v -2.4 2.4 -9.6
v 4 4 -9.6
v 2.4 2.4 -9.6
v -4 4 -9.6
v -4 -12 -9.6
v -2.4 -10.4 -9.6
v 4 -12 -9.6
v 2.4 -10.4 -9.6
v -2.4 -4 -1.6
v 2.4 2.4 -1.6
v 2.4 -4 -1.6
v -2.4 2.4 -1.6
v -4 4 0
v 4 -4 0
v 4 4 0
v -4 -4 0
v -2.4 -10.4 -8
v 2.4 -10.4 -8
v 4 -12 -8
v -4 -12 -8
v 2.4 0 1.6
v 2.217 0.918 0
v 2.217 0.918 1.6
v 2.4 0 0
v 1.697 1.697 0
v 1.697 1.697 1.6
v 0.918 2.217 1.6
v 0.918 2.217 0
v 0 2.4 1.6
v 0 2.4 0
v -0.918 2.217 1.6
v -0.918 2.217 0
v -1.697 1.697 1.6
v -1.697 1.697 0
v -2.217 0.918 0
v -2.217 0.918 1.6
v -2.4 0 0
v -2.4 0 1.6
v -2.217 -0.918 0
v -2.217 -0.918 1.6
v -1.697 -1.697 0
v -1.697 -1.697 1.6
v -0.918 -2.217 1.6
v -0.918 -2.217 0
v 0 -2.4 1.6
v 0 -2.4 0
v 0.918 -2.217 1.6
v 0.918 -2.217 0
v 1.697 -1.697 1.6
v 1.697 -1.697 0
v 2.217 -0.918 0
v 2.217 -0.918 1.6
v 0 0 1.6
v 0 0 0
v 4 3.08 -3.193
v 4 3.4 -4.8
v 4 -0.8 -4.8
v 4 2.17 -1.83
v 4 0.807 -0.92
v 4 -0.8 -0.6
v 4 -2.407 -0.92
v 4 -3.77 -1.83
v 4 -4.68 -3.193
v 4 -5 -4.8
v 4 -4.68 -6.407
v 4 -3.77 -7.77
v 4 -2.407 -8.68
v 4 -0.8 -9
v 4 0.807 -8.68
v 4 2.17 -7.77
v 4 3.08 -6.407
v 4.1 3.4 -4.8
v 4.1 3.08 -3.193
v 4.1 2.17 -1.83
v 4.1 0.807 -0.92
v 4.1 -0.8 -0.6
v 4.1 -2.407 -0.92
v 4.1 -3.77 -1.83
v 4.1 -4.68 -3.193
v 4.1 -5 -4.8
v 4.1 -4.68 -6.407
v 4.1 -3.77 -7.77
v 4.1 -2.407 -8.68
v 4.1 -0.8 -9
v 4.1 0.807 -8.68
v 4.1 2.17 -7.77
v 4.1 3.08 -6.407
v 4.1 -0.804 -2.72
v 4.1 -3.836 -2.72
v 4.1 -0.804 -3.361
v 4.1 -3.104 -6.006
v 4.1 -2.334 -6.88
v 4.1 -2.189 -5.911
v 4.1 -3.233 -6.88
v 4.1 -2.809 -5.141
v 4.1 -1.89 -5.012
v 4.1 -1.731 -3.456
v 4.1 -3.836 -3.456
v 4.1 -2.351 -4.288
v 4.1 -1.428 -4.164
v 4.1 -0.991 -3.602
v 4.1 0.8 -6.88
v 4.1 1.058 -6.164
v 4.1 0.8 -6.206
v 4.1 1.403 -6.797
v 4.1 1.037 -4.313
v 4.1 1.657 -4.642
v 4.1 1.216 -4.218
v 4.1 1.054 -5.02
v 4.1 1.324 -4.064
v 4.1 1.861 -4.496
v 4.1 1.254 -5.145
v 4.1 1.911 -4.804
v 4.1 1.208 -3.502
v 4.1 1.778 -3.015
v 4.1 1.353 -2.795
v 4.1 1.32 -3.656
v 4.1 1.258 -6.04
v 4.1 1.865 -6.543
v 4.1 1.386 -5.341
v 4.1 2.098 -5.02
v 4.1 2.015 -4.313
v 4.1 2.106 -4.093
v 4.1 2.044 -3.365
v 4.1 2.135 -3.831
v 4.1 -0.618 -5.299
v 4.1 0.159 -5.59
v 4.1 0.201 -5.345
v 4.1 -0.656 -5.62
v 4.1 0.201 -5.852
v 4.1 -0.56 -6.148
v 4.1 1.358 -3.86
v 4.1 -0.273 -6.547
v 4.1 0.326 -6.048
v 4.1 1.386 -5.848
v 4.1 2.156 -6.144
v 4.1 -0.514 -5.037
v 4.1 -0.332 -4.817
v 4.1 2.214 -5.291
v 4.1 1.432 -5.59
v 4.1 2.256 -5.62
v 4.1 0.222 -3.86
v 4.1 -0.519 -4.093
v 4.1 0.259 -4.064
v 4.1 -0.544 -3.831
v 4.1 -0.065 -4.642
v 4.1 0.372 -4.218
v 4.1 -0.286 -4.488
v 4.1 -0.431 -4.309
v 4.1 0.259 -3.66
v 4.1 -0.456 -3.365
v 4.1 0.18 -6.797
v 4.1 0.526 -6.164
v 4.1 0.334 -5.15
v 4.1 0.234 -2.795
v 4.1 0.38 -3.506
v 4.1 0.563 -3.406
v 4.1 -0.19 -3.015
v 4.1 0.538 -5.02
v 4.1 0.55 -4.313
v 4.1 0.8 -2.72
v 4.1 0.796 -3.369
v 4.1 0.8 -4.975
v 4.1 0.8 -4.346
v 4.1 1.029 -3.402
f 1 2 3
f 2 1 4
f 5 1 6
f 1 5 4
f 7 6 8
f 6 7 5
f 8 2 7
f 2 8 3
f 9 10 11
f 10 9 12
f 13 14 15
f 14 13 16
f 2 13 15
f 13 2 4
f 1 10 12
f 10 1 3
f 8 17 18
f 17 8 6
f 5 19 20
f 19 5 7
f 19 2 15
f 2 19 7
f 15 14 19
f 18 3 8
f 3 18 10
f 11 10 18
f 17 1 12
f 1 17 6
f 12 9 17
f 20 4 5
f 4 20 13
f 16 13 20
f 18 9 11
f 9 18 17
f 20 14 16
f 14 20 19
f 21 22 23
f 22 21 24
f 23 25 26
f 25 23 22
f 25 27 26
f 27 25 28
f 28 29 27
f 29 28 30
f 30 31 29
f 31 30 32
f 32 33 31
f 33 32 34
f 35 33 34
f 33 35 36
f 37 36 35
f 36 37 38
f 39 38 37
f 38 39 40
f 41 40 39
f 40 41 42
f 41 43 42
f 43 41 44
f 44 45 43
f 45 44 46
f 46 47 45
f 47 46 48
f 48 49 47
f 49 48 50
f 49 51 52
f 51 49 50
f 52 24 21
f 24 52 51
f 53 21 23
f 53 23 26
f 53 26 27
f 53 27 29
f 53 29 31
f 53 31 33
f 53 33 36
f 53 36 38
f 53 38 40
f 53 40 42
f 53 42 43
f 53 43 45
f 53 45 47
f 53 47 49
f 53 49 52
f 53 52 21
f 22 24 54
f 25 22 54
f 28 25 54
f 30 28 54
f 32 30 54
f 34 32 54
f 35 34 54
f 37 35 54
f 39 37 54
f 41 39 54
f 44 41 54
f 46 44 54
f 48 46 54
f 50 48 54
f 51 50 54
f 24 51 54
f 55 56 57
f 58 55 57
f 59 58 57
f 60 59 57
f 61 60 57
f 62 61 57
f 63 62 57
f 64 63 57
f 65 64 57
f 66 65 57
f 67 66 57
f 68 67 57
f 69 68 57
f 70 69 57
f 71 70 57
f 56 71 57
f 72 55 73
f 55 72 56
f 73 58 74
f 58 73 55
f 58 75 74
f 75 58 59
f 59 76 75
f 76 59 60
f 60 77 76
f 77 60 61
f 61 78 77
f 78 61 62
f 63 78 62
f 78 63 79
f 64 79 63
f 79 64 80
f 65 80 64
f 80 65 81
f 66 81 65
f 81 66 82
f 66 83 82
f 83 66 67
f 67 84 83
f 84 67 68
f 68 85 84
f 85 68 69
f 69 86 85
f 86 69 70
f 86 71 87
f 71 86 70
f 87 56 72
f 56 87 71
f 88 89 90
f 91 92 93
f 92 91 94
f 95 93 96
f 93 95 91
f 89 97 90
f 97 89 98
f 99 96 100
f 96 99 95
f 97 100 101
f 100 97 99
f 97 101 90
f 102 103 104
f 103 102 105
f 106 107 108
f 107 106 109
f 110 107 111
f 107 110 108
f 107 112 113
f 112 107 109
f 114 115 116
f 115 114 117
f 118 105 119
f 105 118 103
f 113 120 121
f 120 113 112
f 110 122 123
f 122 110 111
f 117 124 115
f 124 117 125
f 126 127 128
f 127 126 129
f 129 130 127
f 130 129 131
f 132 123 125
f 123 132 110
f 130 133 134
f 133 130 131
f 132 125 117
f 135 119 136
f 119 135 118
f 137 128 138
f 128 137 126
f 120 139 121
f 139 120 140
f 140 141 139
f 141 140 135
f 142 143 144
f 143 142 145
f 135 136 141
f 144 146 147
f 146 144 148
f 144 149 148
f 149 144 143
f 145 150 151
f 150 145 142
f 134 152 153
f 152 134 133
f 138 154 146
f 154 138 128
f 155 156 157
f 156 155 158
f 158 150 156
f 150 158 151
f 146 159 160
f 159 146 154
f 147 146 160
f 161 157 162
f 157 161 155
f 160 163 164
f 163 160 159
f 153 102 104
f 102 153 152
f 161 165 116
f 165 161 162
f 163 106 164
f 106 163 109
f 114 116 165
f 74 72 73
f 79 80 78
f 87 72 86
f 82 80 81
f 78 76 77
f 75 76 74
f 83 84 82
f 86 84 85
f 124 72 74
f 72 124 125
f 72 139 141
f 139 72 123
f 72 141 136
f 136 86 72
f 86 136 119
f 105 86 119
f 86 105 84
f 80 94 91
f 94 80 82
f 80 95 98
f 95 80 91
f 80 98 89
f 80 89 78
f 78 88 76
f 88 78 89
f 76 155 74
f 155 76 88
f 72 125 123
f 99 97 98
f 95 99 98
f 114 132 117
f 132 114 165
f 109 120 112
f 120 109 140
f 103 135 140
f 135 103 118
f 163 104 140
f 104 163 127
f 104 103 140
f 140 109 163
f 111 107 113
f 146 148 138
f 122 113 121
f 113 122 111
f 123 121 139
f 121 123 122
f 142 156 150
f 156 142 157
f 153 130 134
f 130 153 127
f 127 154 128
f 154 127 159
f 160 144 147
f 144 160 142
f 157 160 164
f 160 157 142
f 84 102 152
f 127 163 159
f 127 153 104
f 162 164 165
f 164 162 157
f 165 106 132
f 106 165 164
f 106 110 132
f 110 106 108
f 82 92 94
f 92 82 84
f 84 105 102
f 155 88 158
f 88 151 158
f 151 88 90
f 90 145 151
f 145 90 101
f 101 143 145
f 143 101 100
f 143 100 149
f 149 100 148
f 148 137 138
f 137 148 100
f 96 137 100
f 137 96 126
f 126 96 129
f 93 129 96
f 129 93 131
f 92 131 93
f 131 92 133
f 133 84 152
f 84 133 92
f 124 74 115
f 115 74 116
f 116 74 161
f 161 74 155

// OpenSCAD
// file: ../p/4-4edge.scad
use <../lib.scad>
function ldraw_lib__4_4edge() = [
// 0 Circle 1.0
// 0 Name: 4-4edge.dat
// 0 Author: James Jessiman
// 0 !LDRAW_ORG Primitive UPDATE 2017-01
// 0 !LICENSE Licensed under CC BY 2.0 and CC BY 4.0 : see CAreadme.txt
// 
// 0 BFC CERTIFY CCW
  [0,"BFC","CERTIFY"],
  [0,"BFC","CCW"],
// 
// 0 !HISTORY 1998-12-15 [PTadmin] Official Update 1998-10
// 0 !HISTORY 2005-12-28 [PTadmin] Official Update 2005-01
// 0 !HISTORY 2007-06-24 [PTadmin] Header formatted for Contributor Agreement
// 0 !HISTORY 2008-07-01 [PTadmin] Official Update 2008-01
// 0 !HISTORY 2017-01-15 [Steffen] BFCed
// 0 !HISTORY 2017-12-30 [PTadmin] Official Update 2017-01
// 
// 
// 2 24 1 0 0 0.9239 0 0.3827
  [2,24,1,0,0,0.9239,0,0.3827],
// 2 24 0.9239 0 0.3827 0.7071 0 0.7071
  [2,24,0.9239,0,0.3827,0.7071,0,0.7071],
// 2 24 0.7071 0 0.7071 0.3827 0 0.9239
  [2,24,0.7071,0,0.7071,0.3827,0,0.9239],
// 2 24 0.3827 0 0.9239 0 0 1
  [2,24,0.3827,0,0.9239,0,0,1],
// 2 24 0 0 1 -0.3827 0 0.9239
  [2,24,0,0,1,-0.3827,0,0.9239],
// 2 24 -0.3827 0 0.9239 -0.7071 0 0.7071
  [2,24,-0.3827,0,0.9239,-0.7071,0,0.7071],
// 2 24 -0.7071 0 0.7071 -0.9239 0 0.3827
  [2,24,-0.7071,0,0.7071,-0.9239,0,0.3827],
// 2 24 -0.9239 0 0.3827 -1 0 -0
  [2,24,-0.9239,0,0.3827,-1,0,-0],
// 2 24 -1 0 -0 -0.9239 0 -0.3827
  [2,24,-1,0,-0,-0.9239,0,-0.3827],
// 2 24 -0.9239 0 -0.3827 -0.7071 0 -0.7071
  [2,24,-0.9239,0,-0.3827,-0.7071,0,-0.7071],
// 2 24 -0.7071 0 -0.7071 -0.3827 0 -0.9239
  [2,24,-0.7071,0,-0.7071,-0.3827,0,-0.9239],
// 2 24 -0.3827 0 -0.9239 0 0 -1
  [2,24,-0.3827,0,-0.9239,0,0,-1],
// 2 24 0 0 -1 0.3827 0 -0.9239
  [2,24,0,0,-1,0.3827,0,-0.9239],
// 2 24 0.3827 0 -0.9239 0.7071 0 -0.7071
  [2,24,0.3827,0,-0.9239,0.7071,0,-0.7071],
// 2 24 0.7071 0 -0.7071 0.9239 0 -0.3827
  [2,24,0.7071,0,-0.7071,0.9239,0,-0.3827],
// 2 24 0.9239 0 -0.3827 1 0 0
  [2,24,0.9239,0,-0.3827,1,0,0],
];
module ldraw_lib__4_4edge(step=0, col=false, unit=2/5, alt=false, line=0.2, solid=!$preview)
    makepoly(ldraw_lib__4_4edge(), step=step, col=col, unit=unit, alt=alt, line=line, solid=solid);
ldraw_lib__4_4edge(line=0.2);
// file: ../p/4-4disc.scad
use <../lib.scad>
function ldraw_lib__4_4disc() = [
// 0 Disc 1.0
// 0 Name: 4-4disc.dat
// 0 Author: James Jessiman
// 0 !LDRAW_ORG Primitive UPDATE 2002-02
// 0 !LICENSE Licensed under CC BY 2.0 and CC BY 4.0 : see CAreadme.txt
// 
// 0 BFC CERTIFY CCW
  [0,"BFC","CERTIFY"],
  [0,"BFC","CCW"],
// 
// 0 !HISTORY 1998-12-15 [PTadmin] Official Update 1998-10
// 0 !HISTORY 2002-03-23 [sbliss] Added BFC statement
// 0 !HISTORY 2002-04-25 [PTadmin] Official Update 2002-02
// 0 !HISTORY 2007-06-24 [PTadmin] Header formatted for Contributor Agreement
// 0 !HISTORY 2008-07-01 [PTadmin] Official Update 2008-01
// 
// 
// 3 16 0 0 0 1 0 0 0.9239 0 0.3827
  [3,16,0,0,0,1,0,0,0.9239,0,0.3827],
// 3 16 0 0 0 0.9239 0 0.3827 0.7071 0 0.7071
  [3,16,0,0,0,0.9239,0,0.3827,0.7071,0,0.7071],
// 3 16 0 0 0 0.7071 0 0.7071 0.3827 0 0.9239
  [3,16,0,0,0,0.7071,0,0.7071,0.3827,0,0.9239],
// 3 16 0 0 0 0.3827 0 0.9239 0 0 1
  [3,16,0,0,0,0.3827,0,0.9239,0,0,1],
// 3 16 0 0 0 0 0 1 -0.3827 0 0.9239
  [3,16,0,0,0,0,0,1,-0.3827,0,0.9239],
// 3 16 0 0 0 -0.3827 0 0.9239 -0.7071 0 0.7071
  [3,16,0,0,0,-0.3827,0,0.9239,-0.7071,0,0.7071],
// 3 16 0 0 0 -0.7071 0 0.7071 -0.9239 0 0.3827
  [3,16,0,0,0,-0.7071,0,0.7071,-0.9239,0,0.3827],
// 3 16 0 0 0 -0.9239 0 0.3827 -1 0 -0
  [3,16,0,0,0,-0.9239,0,0.3827,-1,0,-0],
// 3 16 0 0 0 -1 0 -0 -0.9239 0 -0.3827
  [3,16,0,0,0,-1,0,-0,-0.9239,0,-0.3827],
// 3 16 0 0 0 -0.9239 0 -0.3827 -0.7071 0 -0.7071
  [3,16,0,0,0,-0.9239,0,-0.3827,-0.7071,0,-0.7071],
// 3 16 0 0 0 -0.7071 0 -0.7071 -0.3827 0 -0.9239
  [3,16,0,0,0,-0.7071,0,-0.7071,-0.3827,0,-0.9239],
// 3 16 0 0 0 -0.3827 0 -0.9239 0 0 -1
  [3,16,0,0,0,-0.3827,0,-0.9239,0,0,-1],
// 3 16 0 0 0 0 0 -1 0.3827 0 -0.9239
  [3,16,0,0,0,0,0,-1,0.3827,0,-0.9239],
// 3 16 0 0 0 0.3827 0 -0.9239 0.7071 0 -0.7071
  [3,16,0,0,0,0.3827,0,-0.9239,0.7071,0,-0.7071],
// 3 16 0 0 0 0.7071 0 -0.7071 0.9239 0 -0.3827
  [3,16,0,0,0,0.7071,0,-0.7071,0.9239,0,-0.3827],
// 3 16 0 0 0 0.9239 0 -0.3827 1 0 0
  [3,16,0,0,0,0.9239,0,-0.3827,1,0,0],
// 0
];
module ldraw_lib__4_4disc(step=0, col=false, unit=2/5, alt=false, line=0.2, solid=!$preview)
    makepoly(ldraw_lib__4_4disc(), step=step, col=col, unit=unit, alt=alt, line=line, solid=solid);
ldraw_lib__4_4disc(line=0.2);
// file: ../p/4-4cyli.scad
use <../lib.scad>
$fa=1; $fs=0.2;
function ldraw_lib__4_4cyli(realsolid=false) = [
// 0 Cylinder 1.0
// 0 Name: 4-4cyli.dat
// 0 Author: James Jessiman
// 0 !LDRAW_ORG Primitive UPDATE 2005-01
// 0 !LICENSE Licensed under CC BY 2.0 and CC BY 4.0 : see CAreadme.txt
// 
// 0 BFC CERTIFY CCW
  [0,"BFC","CERTIFY"],
  [0,"BFC","CCW"],
// 
// 0 !HISTORY 1998-12-15 [PTadmin] Official Update 1998-10
// 0 !HISTORY 2002-03-23 [sbliss] Added BFC statement; merged headers from files in distributions LDraw 0.27 and Complete.
// 0 !HISTORY 2002-04-25 [PTadmin] Official Update 2002-02
// 0 !HISTORY 2004-12-14 [guyvivan] BFC CCW
// 0 !HISTORY 2005-12-28 [PTadmin] Official Update 2005-01
// 0 !HISTORY 2007-06-24 [PTadmin] Header formatted for Contributor Agreement
// 0 !HISTORY 2008-07-01 [PTadmin] Official Update 2008-01
// 
// 
// 4 16 1 1 0 0.9239 1 0.3827 0.9239 0 0.3827 1 0 0
  [4,16,1,1,0,0.9239,1,0.3827,0.9239,0,0.3827,1,0,0],
// 5 24 1 0 0 1 1 0 0.9239 0 0.3827 0.9239 0 -0.3827
  [5,24,1,0,0,1,1,0,0.9239,0,0.3827,0.9239,0,-0.3827],
// 4 16 0.9239 1 0.3827 0.7071 1 0.7071 0.7071 0 0.7071 0.9239 0 0.3827
  [4,16,0.9239,1,0.3827,0.7071,1,0.7071,0.7071,0,0.7071,0.9239,0,0.3827],
// 5 24 0.9239 0 0.3827 0.9239 1 0.3827 0.7071 0 0.7071 1 0 0
  [5,24,0.9239,0,0.3827,0.9239,1,0.3827,0.7071,0,0.7071,1,0,0],
// 4 16 0.7071 1 0.7071 0.3827 1 0.9239 0.3827 0 0.9239 0.7071 0 0.7071
  [4,16,0.7071,1,0.7071,0.3827,1,0.9239,0.3827,0,0.9239,0.7071,0,0.7071],
// 5 24 0.7071 0 0.7071 0.7071 1 0.7071 0.3827 0 0.9239 0.9239 0 0.3827
  [5,24,0.7071,0,0.7071,0.7071,1,0.7071,0.3827,0,0.9239,0.9239,0,0.3827],
// 4 16 0.3827 1 0.9239 0 1 1 0 0 1 0.3827 0 0.9239
  [4,16,0.3827,1,0.9239,0,1,1,0,0,1,0.3827,0,0.9239],
// 5 24 0.3827 0 0.9239 0.3827 1 0.9239 0 0 1 0.7071 0 0.7071
  [5,24,0.3827,0,0.9239,0.3827,1,0.9239,0,0,1,0.7071,0,0.7071],
// 4 16 0 1 1 -0.3827 1 0.9239 -0.3827 0 0.9239 0 0 1
  [4,16,0,1,1,-0.3827,1,0.9239,-0.3827,0,0.9239,0,0,1],
// 5 24 0 0 1 0 1 1 -0.3827 0 0.9239 0.3827 0 0.9239
  [5,24,0,0,1,0,1,1,-0.3827,0,0.9239,0.3827,0,0.9239],
// 4 16 -0.3827 1 0.9239 -0.7071 1 0.7071 -0.7071 0 0.7071 -0.3827 0 0.9239
  [4,16,-0.3827,1,0.9239,-0.7071,1,0.7071,-0.7071,0,0.7071,-0.3827,0,0.9239],
// 5 24 -0.3827 0 0.9239 -0.3827 1 0.9239 -0.7071 0 0.7071 0 0 1
  [5,24,-0.3827,0,0.9239,-0.3827,1,0.9239,-0.7071,0,0.7071,0,0,1],
// 4 16 -0.7071 1 0.7071 -0.9239 1 0.3827 -0.9239 0 0.3827 -0.7071 0 0.7071
  [4,16,-0.7071,1,0.7071,-0.9239,1,0.3827,-0.9239,0,0.3827,-0.7071,0,0.7071],
// 5 24 -0.7071 0 0.7071 -0.7071 1 0.7071 -0.9239 0 0.3827 -0.3827 0 0.9239
  [5,24,-0.7071,0,0.7071,-0.7071,1,0.7071,-0.9239,0,0.3827,-0.3827,0,0.9239],
// 4 16 -0.9239 1 0.3827 -1 1 0 -1 0 0 -0.9239 0 0.3827
  [4,16,-0.9239,1,0.3827,-1,1,0,-1,0,0,-0.9239,0,0.3827],
// 5 24 -0.9239 0 0.3827 -0.9239 1 0.3827 -1 0 0 -0.7071 0 0.7071
  [5,24,-0.9239,0,0.3827,-0.9239,1,0.3827,-1,0,0,-0.7071,0,0.7071],
// 4 16 -1 1 0 -0.9239 1 -0.3827 -0.9239 0 -0.3827 -1 0 0
  [4,16,-1,1,0,-0.9239,1,-0.3827,-0.9239,0,-0.3827,-1,0,0],
// 5 24 -1 0 0 -1 1 0 -0.9239 0 -0.3827 -0.9239 0 0.3827
  [5,24,-1,0,0,-1,1,0,-0.9239,0,-0.3827,-0.9239,0,0.3827],
// 4 16 -0.9239 1 -0.3827 -0.7071 1 -0.7071 -0.7071 0 -0.7071 -0.9239 0 -0.3827
  [4,16,-0.9239,1,-0.3827,-0.7071,1,-0.7071,-0.7071,0,-0.7071,-0.9239,0,-0.3827],
// 5 24 -0.9239 0 -0.3827 -0.9239 1 -0.3827 -0.7071 0 -0.7071 -1 0 0
  [5,24,-0.9239,0,-0.3827,-0.9239,1,-0.3827,-0.7071,0,-0.7071,-1,0,0],
// 4 16 -0.7071 1 -0.7071 -0.3827 1 -0.9239 -0.3827 0 -0.9239 -0.7071 0 -0.7071
  [4,16,-0.7071,1,-0.7071,-0.3827,1,-0.9239,-0.3827,0,-0.9239,-0.7071,0,-0.7071],
// 5 24 -0.7071 0 -0.7071 -0.7071 1 -0.7071 -0.3827 0 -0.9239 -0.9239 0 -0.3827
  [5,24,-0.7071,0,-0.7071,-0.7071,1,-0.7071,-0.3827,0,-0.9239,-0.9239,0,-0.3827],
// 4 16 -0.3827 1 -0.9239 0 1 -1 0 0 -1 -0.3827 0 -0.9239
  [4,16,-0.3827,1,-0.9239,0,1,-1,0,0,-1,-0.3827,0,-0.9239],
// 5 24 -0.3827 0 -0.9239 -0.3827 1 -0.9239 0 0 -1 -0.7071 0 -0.7071
  [5,24,-0.3827,0,-0.9239,-0.3827,1,-0.9239,0,0,-1,-0.7071,0,-0.7071],
// 4 16 0 1 -1 0.3827 1 -0.9239 0.3827 0 -0.9239 0 0 -1
  [4,16,0,1,-1,0.3827,1,-0.9239,0.3827,0,-0.9239,0,0,-1],
// 5 24 0 0 -1 0 1 -1 0.3827 0 -0.9239 -0.3827 0 -0.9239
  [5,24,0,0,-1,0,1,-1,0.3827,0,-0.9239,-0.3827,0,-0.9239],
// 4 16 0.3827 1 -0.9239 0.7071 1 -0.7071 0.7071 0 -0.7071 0.3827 0 -0.9239
  [4,16,0.3827,1,-0.9239,0.7071,1,-0.7071,0.7071,0,-0.7071,0.3827,0,-0.9239],
// 5 24 0.3827 0 -0.9239 0.3827 1 -0.9239 0.7071 0 -0.7071 0 0 -1
  [5,24,0.3827,0,-0.9239,0.3827,1,-0.9239,0.7071,0,-0.7071,0,0,-1],
// 4 16 0.7071 1 -0.7071 0.9239 1 -0.3827 0.9239 0 -0.3827 0.7071 0 -0.7071
  [4,16,0.7071,1,-0.7071,0.9239,1,-0.3827,0.9239,0,-0.3827,0.7071,0,-0.7071],
// 5 24 0.7071 0 -0.7071 0.7071 1 -0.7071 0.9239 0 -0.3827 0.3827 0 -0.9239
  [5,24,0.7071,0,-0.7071,0.7071,1,-0.7071,0.9239,0,-0.3827,0.3827,0,-0.9239],
// 4 16 0.9239 1 -0.3827 1 1 0 1 0 0 0.9239 0 -0.3827
  [4,16,0.9239,1,-0.3827,1,1,0,1,0,0,0.9239,0,-0.3827],
// 5 24 0.9239 0 -0.3827 0.9239 1 -0.3827 1 0 0 0.7071 0 -0.7071
  [5,24,0.9239,0,-0.3827,0.9239,1,-0.3827,1,0,0,0.7071,0,-0.7071],
// 0
];
module ldraw_lib__4_4cyli(step=0, col=false, unit=2/5, alt=false, line=0.2, solid=!$preview)
    makepoly(ldraw_lib__4_4cyli(solid), step=step, col=col, unit=unit, alt=alt, line=line, solid=solid);
ldraw_lib__4_4cyli(line=0.2);
// file: ../p/stud.scad
use <../lib.scad>
use <4-4cyli.scad>
use <4-4disc.scad>
use <4-4edge.scad>
function ldraw_lib__stud() = [
// 0 Stud
// 0 Name: stud.dat
// 0 Author: James Jessiman
// 0 !LDRAW_ORG Primitive UPDATE 2012-01
// 0 !LICENSE Licensed under CC BY 4.0 : see CAreadme.txt
// 
// 0 BFC CERTIFY CCW
  [0,"BFC","CERTIFY"],
  [0,"BFC","CCW"],
// 
// 0 !HISTORY 2002-04-04 [sbliss] Modified for BFC compliance
// 0 !HISTORY 2002-04-25 [PTadmin] Official Update 2002-02
// 0 !HISTORY 2007-06-24 [PTadmin] Header formatted for Contributor Agreement
// 0 !HISTORY 2008-07-01 [PTadmin] Official Update 2008-01
// 0 !HISTORY 2012-02-16 [Philo] Changed to CCW
// 0 !HISTORY 2012-03-30 [PTadmin] Official Update 2012-01
// 
// 
// 1 16 0 0 0 6 0 0 0 1 0 0 0 6 4-4edge.dat
  [1,16,0,0,0,6,0,0,0,1,0,0,0,6, ldraw_lib__4_4edge()],
// 1 16 0 -4 0 6 0 0 0 1 0 0 0 6 4-4edge.dat
  [1,16,0,-4,0,6,0,0,0,1,0,0,0,6, ldraw_lib__4_4edge()],
// 1 16 0 0 0 6 0 0 0 -4 0 0 0 6 4-4cyli.dat
  [1,16,0,0,0,6,0,0,0,-4,0,0,0,6, ldraw_lib__4_4cyli()],
// 1 16 0 -4 0 6 0 0 0 1 0 0 0 6 4-4disc.dat
  [1,16,0,-4,0,6,0,0,0,1,0,0,0,6, ldraw_lib__4_4disc()],
  [-1,16,0,0,0,6,0,0,0,-1,0,0,0,6, ldraw_lib__4_4disc()],
];
module ldraw_lib__stud(step=0, col=false, unit=2/5, alt=false, line=0.2, solid=!$preview)
    makepoly(ldraw_lib__stud(), step=step, col=col, unit=unit, alt=alt, line=line, solid=solid);
ldraw_lib__stud(line=0.2);
// file: ../p/4-4cylc3.scad
use <../lib.scad>
use <4-4cyli.scad>
use <4-4disc.scad>
function ldraw_lib__4_4cylc3() = [
// 0 Cylinder Closed 1.0 without Top or Bottom Edge Lines
// 0 Name: 4-4cylc3.dat
// 0 Author: Chris Dee [cwdee]
// 0 !LDRAW_ORG Primitive UPDATE 2017-01
// 0 !LICENSE Licensed under CC BY 4.0 : see CAreadme.txt
// 
// 0 BFC CERTIFY CCW
  [0,"BFC","CERTIFY"],
  [0,"BFC","CCW"],
// 
// 0 !HISTORY 2017-12-30 [PTadmin] Official Update 2017-01
// 
// 
// 1 16 0 0 0 1 0 0 0 1 0 0 0 1 4-4disc.dat
  [1,16,0,0,0,1,0,0,0,1,0,0,0,1, ldraw_lib__4_4disc()],
// 1 16 0 0 0 1 0 0 0 1 0 0 0 1 4-4cyli.dat
  [1,16,0,0,0,1,0,0,0,1,0,0,0,1, ldraw_lib__4_4cyli()],
// 0
];
module ldraw_lib__4_4cylc3(step=0, col=false, unit=2/5, alt=false, line=0.2, solid=!$preview)
    makepoly(ldraw_lib__4_4cylc3(), step=step, col=col, unit=unit, alt=alt, line=line, solid=solid);
ldraw_lib__4_4cylc3(line=0.2);
// file: ../p/1-8chrd.scad
use <../lib.scad>
$fa=1; $fs=0.2;
function ldraw_lib__1_8chrd(realsolid=false) = [
// 0 Chord 0.125
// 0 Name: 1-8chrd.dat
// 0 Author: Andy Westrate [westrate]
// 0 !LDRAW_ORG Primitive UPDATE 2004-02
// 0 !LICENSE Licensed under CC BY 2.0 and CC BY 4.0 : see CAreadme.txt
// 
// 0 BFC CERTIFY CCW
  [0,"BFC","CERTIFY"],
  [0,"BFC","CCW"],
// 
// 0 !HISTORY 2004-04-22 [PTadmin] Official Update 2004-02
// 0 !HISTORY 2007-06-22 [PTadmin] Header formatted for Contributor Agreement
// 0 !HISTORY 2008-07-01 [PTadmin] Official Update 2008-01
// 
// 
// 3 16 0.7071 0 0.7071 1 0 0 0.9239 0 0.3827
  [3,16,0.7071,0,0.7071,1,0,0,0.9239,0,0.3827],
// 
// 0
];
module ldraw_lib__1_8chrd(step=0, col=false, unit=2/5, alt=false, line=0.2, solid=!$preview)
    makepoly(ldraw_lib__1_8chrd(solid), step=step, col=col, unit=unit, alt=alt, line=line, solid=solid);
ldraw_lib__1_8chrd(line=0.2);
// file: 3040a.scad
use <../lib.scad>
use <../p/stud.scad>
function ldraw_lib__3040a() = [
// 0 Slope Brick 45  2 x  1 without Centre Stud
// 0 Name: 3040a.dat
// 0 Author: Michael Heidemann [mikeheide]
// 0 !LDRAW_ORG Part UPDATE 2004-04
// 0 !LICENSE Licensed under CC BY 4.0 : see CAreadme.txt
// 
// 0 BFC CERTIFY CCW
  [0,"BFC","CERTIFY"],
  [0,"BFC","CCW"],
// 
// 0 !HISTORY 2004-11-06 [PTadmin] Official Update 2004-04
// 0 !HISTORY 2007-06-09 [PTadmin] Header formatted for Contributor Agreement
// 0 !HISTORY 2008-07-01 [PTadmin] Official Update 2008-01
// 
// 
// 2 24 6 24 6 -6 24 6
  [2,24,6,24,6,-6,24,6],
// 2 24 -6 24 6 -6 24 -26
  [2,24,-6,24,6,-6,24,-26],
// 2 24 -6 24 -26 6 24 -26
  [2,24,-6,24,-26,6,24,-26],
// 2 24 6 24 -26 6 24 6
  [2,24,6,24,-26,6,24,6],
// 2 24 10 24 10 -10 24 10
  [2,24,10,24,10,-10,24,10],
// 2 24 -10 24 10 -10 24 -30
  [2,24,-10,24,10,-10,24,-30],
// 2 24 -10 24 -30 10 24 -30
  [2,24,-10,24,-30,10,24,-30],
// 2 24 10 24 -30 10 24 10
  [2,24,10,24,-30,10,24,10],
// 2 24 6 24 6 6 4 6
  [2,24,6,24,6,6,4,6],
// 2 24 -6 24 6 -6 4 6
  [2,24,-6,24,6,-6,4,6],
// 2 24 6 24 -26 6 20 -26
  [2,24,6,24,-26,6,20,-26],
// 2 24 -6 24 -26 -6 20 -26
  [2,24,-6,24,-26,-6,20,-26],
// 2 24 6 4 6 -6 4 6
  [2,24,6,4,6,-6,4,6],
// 2 24 6 4 -10 -6 4 -10
  [2,24,6,4,-10,-6,4,-10],
// 2 24 6 20 -26 -6 20 -26
  [2,24,6,20,-26,-6,20,-26],
// 2 24 6 4 6 6 4 -10
  [2,24,6,4,6,6,4,-10],
// 2 24 -6 4 6 -6 4 -10
  [2,24,-6,4,6,-6,4,-10],
// 2 24 6 20 -26 6 4 -10
  [2,24,6,20,-26,6,4,-10],
// 2 24 -6 20 -26 -6 4 -10
  [2,24,-6,20,-26,-6,4,-10],
// 2 24 10 24 10 10 0 10
  [2,24,10,24,10,10,0,10],
// 2 24 -10 24 10 -10 0 10
  [2,24,-10,24,10,-10,0,10],
// 2 24 10 24 -30 10 20 -30
  [2,24,10,24,-30,10,20,-30],
// 2 24 -10 24 -30 -10 20 -30
  [2,24,-10,24,-30,-10,20,-30],
// 2 24 10 0 10 -10 0 10
  [2,24,10,0,10,-10,0,10],
// 2 24 10 0 -10 -10 0 -10
  [2,24,10,0,-10,-10,0,-10],
// 2 24 10 20 -30 -10 20 -30
  [2,24,10,20,-30,-10,20,-30],
// 2 24 10 0 10 10 0 -10
  [2,24,10,0,10,10,0,-10],
// 2 24 -10 0 10 -10 0 -10
  [2,24,-10,0,10,-10,0,-10],
// 2 24 10 20 -30 10 0 -10
  [2,24,10,20,-30,10,0,-10],
// 2 24 -10 20 -30 -10 0 -10
  [2,24,-10,20,-30,-10,0,-10],
// 4 16 10 24 10 6 24 6 -6 24 6 -10 24 10
  [4,16,10,24,10,6,24,6,-6,24,6,-10,24,10],
// 4 16 -10 24 10 -6 24 6 -6 24 -26 -10 24 -30
  [4,16,-10,24,10,-6,24,6,-6,24,-26,-10,24,-30],
// 4 16 -10 24 -30 -6 24 -26 6 24 -26 10 24 -30
  [4,16,-10,24,-30,-6,24,-26,6,24,-26,10,24,-30],
// 4 16 10 24 -30 6 24 -26 6 24 6 10 24 10
  [4,16,10,24,-30,6,24,-26,6,24,6,10,24,10],
// 4 16 6 4 6 6 4 -10 -6 4 -10 -6 4 6
  [4,16,6,4,6,6,4,-10,-6,4,-10,-6,4,6],
// 4 16 10 0 -10 10 0 10 -10 0 10 -10 0 -10
  [4,16,10,0,-10,10,0,10,-10,0,10,-10,0,-10],
// 4 16 -10 24 10 -10 0 10 10 0 10 10 24 10
  [4,16,-10,24,10,-10,0,10,10,0,10,10,24,10],
// 4 16 6 24 6 6 4 6 -6 4 6 -6 24 6
  [4,16,6,24,6,6,4,6,-6,4,6,-6,24,6],
// 4 16 -6 24 -26 -6 20 -26 6 20 -26 6 24 -26
  [4,16,-6,24,-26,-6,20,-26,6,20,-26,6,24,-26],
// 4 16 10 24 -30 10 20 -30 -10 20 -30 -10 24 -30
  [4,16,10,24,-30,10,20,-30,-10,20,-30,-10,24,-30],
// 4 16 10 24 10 10 0 10 10 20 -30 10 24 -30
  [4,16,10,24,10,10,0,10,10,20,-30,10,24,-30],
// 3 16 10 0 10 10 0 -10 10 20 -30
  [3,16,10,0,10,10,0,-10,10,20,-30],
// 4 16 6 24 -26 6 20 -26 6 4 6 6 24 6
  [4,16,6,24,-26,6,20,-26,6,4,6,6,24,6],
// 3 16 6 4 -10 6 4 6 6 20 -26
  [3,16,6,4,-10,6,4,6,6,20,-26],
// 4 16 -6 24 6 -6 4 6 -6 20 -26 -6 24 -26
  [4,16,-6,24,6,-6,4,6,-6,20,-26,-6,24,-26],
// 3 16 -6 4 6 -6 4 -10 -6 20 -26
  [3,16,-6,4,6,-6,4,-10,-6,20,-26],
// 4 16 -10 24 -30 -10 20 -30 -10 0 10 -10 24 10
  [4,16,-10,24,-30,-10,20,-30,-10,0,10,-10,24,10],
// 3 16 -10 0 -10 -10 0 10 -10 20 -30
  [3,16,-10,0,-10,-10,0,10,-10,20,-30],
// 4 16 6 4 -10 6 20 -26 -6 20 -26 -6 4 -10
  [4,16,6,4,-10,6,20,-26,-6,20,-26,-6,4,-10],
// 4 16 10 20 -30 10 0 -10 -10 0 -10 -10 20 -30
  [4,16,10,20,-30,10,0,-10,-10,0,-10,-10,20,-30],
// 1 16 0 0 0 1 0 0 0 1 0 0 0 1 stud.dat
  [1,16,0,0,0,1,0,0,0,1,0,0,0,1, ldraw_lib__stud()],
// 0
];
module ldraw_lib__3040a(step=0, col=false, unit=2/5, alt=false, line=0.2, solid=!$preview)
    makepoly(ldraw_lib__3040a(), step=step, col=col, unit=unit, alt=alt, line=line, solid=solid);
ldraw_lib__3040a(line=0.2);
// main file
use <../lib.scad>
use <003667d.scad>
use <3040a.scad>
function ldraw_lib__3040ad04() = [
// 0 Slope Brick 45  2 x  1 with "78" Right Sticker
// 0 Name: 3040ad04.dat
// 0 Author: Takeshi Takahashi [RainbowDolphin]
// 0 !LDRAW_ORG Shortcut UPDATE 2024-10
// 0 !LICENSE Licensed under CC BY 4.0 : see CAreadme.txt
// 
// 0 BFC CERTIFY CCW
  [0,"BFC","CERTIFY"],
  [0,"BFC","CCW"],
// 
// 0 !CATEGORY Sticker Shortcut
// 0 !KEYWORDS Bricklink 3040apb02R, Rally Car, Set 619-1
// 
// 0 !HISTORY 2024-12-01 [OrionP] Official Update 2024-10
// 
// 1 16 0 0 0 1 0 0 0 1 0 0 0 1 3040a.dat
  [1,16,0,0,0,1,0,0,0,1,0,0,0,1, ldraw_lib__3040a()],
// 1 16 10 12 -2 0 -1 0 0 0 -1 1 0 0 003667d.dat
  [1,16,10,12,-2,0,-1,0,0,0,-1,1,0,0, ldraw_lib__003667d()],
// 0 // 1 16 -10 12 -2 0 1 0 0 0 -1 -1 0 0 003667d.dat
];
module ldraw_lib__3040ad04(step=0, col=false, unit=2/5, alt=false, line=0.2, solid=!$preview)
    makepoly(ldraw_lib__3040ad04(), step=step, col=col, unit=unit, alt=alt, line=line, solid=solid);
ldraw_lib__3040ad04(line=0.2);
